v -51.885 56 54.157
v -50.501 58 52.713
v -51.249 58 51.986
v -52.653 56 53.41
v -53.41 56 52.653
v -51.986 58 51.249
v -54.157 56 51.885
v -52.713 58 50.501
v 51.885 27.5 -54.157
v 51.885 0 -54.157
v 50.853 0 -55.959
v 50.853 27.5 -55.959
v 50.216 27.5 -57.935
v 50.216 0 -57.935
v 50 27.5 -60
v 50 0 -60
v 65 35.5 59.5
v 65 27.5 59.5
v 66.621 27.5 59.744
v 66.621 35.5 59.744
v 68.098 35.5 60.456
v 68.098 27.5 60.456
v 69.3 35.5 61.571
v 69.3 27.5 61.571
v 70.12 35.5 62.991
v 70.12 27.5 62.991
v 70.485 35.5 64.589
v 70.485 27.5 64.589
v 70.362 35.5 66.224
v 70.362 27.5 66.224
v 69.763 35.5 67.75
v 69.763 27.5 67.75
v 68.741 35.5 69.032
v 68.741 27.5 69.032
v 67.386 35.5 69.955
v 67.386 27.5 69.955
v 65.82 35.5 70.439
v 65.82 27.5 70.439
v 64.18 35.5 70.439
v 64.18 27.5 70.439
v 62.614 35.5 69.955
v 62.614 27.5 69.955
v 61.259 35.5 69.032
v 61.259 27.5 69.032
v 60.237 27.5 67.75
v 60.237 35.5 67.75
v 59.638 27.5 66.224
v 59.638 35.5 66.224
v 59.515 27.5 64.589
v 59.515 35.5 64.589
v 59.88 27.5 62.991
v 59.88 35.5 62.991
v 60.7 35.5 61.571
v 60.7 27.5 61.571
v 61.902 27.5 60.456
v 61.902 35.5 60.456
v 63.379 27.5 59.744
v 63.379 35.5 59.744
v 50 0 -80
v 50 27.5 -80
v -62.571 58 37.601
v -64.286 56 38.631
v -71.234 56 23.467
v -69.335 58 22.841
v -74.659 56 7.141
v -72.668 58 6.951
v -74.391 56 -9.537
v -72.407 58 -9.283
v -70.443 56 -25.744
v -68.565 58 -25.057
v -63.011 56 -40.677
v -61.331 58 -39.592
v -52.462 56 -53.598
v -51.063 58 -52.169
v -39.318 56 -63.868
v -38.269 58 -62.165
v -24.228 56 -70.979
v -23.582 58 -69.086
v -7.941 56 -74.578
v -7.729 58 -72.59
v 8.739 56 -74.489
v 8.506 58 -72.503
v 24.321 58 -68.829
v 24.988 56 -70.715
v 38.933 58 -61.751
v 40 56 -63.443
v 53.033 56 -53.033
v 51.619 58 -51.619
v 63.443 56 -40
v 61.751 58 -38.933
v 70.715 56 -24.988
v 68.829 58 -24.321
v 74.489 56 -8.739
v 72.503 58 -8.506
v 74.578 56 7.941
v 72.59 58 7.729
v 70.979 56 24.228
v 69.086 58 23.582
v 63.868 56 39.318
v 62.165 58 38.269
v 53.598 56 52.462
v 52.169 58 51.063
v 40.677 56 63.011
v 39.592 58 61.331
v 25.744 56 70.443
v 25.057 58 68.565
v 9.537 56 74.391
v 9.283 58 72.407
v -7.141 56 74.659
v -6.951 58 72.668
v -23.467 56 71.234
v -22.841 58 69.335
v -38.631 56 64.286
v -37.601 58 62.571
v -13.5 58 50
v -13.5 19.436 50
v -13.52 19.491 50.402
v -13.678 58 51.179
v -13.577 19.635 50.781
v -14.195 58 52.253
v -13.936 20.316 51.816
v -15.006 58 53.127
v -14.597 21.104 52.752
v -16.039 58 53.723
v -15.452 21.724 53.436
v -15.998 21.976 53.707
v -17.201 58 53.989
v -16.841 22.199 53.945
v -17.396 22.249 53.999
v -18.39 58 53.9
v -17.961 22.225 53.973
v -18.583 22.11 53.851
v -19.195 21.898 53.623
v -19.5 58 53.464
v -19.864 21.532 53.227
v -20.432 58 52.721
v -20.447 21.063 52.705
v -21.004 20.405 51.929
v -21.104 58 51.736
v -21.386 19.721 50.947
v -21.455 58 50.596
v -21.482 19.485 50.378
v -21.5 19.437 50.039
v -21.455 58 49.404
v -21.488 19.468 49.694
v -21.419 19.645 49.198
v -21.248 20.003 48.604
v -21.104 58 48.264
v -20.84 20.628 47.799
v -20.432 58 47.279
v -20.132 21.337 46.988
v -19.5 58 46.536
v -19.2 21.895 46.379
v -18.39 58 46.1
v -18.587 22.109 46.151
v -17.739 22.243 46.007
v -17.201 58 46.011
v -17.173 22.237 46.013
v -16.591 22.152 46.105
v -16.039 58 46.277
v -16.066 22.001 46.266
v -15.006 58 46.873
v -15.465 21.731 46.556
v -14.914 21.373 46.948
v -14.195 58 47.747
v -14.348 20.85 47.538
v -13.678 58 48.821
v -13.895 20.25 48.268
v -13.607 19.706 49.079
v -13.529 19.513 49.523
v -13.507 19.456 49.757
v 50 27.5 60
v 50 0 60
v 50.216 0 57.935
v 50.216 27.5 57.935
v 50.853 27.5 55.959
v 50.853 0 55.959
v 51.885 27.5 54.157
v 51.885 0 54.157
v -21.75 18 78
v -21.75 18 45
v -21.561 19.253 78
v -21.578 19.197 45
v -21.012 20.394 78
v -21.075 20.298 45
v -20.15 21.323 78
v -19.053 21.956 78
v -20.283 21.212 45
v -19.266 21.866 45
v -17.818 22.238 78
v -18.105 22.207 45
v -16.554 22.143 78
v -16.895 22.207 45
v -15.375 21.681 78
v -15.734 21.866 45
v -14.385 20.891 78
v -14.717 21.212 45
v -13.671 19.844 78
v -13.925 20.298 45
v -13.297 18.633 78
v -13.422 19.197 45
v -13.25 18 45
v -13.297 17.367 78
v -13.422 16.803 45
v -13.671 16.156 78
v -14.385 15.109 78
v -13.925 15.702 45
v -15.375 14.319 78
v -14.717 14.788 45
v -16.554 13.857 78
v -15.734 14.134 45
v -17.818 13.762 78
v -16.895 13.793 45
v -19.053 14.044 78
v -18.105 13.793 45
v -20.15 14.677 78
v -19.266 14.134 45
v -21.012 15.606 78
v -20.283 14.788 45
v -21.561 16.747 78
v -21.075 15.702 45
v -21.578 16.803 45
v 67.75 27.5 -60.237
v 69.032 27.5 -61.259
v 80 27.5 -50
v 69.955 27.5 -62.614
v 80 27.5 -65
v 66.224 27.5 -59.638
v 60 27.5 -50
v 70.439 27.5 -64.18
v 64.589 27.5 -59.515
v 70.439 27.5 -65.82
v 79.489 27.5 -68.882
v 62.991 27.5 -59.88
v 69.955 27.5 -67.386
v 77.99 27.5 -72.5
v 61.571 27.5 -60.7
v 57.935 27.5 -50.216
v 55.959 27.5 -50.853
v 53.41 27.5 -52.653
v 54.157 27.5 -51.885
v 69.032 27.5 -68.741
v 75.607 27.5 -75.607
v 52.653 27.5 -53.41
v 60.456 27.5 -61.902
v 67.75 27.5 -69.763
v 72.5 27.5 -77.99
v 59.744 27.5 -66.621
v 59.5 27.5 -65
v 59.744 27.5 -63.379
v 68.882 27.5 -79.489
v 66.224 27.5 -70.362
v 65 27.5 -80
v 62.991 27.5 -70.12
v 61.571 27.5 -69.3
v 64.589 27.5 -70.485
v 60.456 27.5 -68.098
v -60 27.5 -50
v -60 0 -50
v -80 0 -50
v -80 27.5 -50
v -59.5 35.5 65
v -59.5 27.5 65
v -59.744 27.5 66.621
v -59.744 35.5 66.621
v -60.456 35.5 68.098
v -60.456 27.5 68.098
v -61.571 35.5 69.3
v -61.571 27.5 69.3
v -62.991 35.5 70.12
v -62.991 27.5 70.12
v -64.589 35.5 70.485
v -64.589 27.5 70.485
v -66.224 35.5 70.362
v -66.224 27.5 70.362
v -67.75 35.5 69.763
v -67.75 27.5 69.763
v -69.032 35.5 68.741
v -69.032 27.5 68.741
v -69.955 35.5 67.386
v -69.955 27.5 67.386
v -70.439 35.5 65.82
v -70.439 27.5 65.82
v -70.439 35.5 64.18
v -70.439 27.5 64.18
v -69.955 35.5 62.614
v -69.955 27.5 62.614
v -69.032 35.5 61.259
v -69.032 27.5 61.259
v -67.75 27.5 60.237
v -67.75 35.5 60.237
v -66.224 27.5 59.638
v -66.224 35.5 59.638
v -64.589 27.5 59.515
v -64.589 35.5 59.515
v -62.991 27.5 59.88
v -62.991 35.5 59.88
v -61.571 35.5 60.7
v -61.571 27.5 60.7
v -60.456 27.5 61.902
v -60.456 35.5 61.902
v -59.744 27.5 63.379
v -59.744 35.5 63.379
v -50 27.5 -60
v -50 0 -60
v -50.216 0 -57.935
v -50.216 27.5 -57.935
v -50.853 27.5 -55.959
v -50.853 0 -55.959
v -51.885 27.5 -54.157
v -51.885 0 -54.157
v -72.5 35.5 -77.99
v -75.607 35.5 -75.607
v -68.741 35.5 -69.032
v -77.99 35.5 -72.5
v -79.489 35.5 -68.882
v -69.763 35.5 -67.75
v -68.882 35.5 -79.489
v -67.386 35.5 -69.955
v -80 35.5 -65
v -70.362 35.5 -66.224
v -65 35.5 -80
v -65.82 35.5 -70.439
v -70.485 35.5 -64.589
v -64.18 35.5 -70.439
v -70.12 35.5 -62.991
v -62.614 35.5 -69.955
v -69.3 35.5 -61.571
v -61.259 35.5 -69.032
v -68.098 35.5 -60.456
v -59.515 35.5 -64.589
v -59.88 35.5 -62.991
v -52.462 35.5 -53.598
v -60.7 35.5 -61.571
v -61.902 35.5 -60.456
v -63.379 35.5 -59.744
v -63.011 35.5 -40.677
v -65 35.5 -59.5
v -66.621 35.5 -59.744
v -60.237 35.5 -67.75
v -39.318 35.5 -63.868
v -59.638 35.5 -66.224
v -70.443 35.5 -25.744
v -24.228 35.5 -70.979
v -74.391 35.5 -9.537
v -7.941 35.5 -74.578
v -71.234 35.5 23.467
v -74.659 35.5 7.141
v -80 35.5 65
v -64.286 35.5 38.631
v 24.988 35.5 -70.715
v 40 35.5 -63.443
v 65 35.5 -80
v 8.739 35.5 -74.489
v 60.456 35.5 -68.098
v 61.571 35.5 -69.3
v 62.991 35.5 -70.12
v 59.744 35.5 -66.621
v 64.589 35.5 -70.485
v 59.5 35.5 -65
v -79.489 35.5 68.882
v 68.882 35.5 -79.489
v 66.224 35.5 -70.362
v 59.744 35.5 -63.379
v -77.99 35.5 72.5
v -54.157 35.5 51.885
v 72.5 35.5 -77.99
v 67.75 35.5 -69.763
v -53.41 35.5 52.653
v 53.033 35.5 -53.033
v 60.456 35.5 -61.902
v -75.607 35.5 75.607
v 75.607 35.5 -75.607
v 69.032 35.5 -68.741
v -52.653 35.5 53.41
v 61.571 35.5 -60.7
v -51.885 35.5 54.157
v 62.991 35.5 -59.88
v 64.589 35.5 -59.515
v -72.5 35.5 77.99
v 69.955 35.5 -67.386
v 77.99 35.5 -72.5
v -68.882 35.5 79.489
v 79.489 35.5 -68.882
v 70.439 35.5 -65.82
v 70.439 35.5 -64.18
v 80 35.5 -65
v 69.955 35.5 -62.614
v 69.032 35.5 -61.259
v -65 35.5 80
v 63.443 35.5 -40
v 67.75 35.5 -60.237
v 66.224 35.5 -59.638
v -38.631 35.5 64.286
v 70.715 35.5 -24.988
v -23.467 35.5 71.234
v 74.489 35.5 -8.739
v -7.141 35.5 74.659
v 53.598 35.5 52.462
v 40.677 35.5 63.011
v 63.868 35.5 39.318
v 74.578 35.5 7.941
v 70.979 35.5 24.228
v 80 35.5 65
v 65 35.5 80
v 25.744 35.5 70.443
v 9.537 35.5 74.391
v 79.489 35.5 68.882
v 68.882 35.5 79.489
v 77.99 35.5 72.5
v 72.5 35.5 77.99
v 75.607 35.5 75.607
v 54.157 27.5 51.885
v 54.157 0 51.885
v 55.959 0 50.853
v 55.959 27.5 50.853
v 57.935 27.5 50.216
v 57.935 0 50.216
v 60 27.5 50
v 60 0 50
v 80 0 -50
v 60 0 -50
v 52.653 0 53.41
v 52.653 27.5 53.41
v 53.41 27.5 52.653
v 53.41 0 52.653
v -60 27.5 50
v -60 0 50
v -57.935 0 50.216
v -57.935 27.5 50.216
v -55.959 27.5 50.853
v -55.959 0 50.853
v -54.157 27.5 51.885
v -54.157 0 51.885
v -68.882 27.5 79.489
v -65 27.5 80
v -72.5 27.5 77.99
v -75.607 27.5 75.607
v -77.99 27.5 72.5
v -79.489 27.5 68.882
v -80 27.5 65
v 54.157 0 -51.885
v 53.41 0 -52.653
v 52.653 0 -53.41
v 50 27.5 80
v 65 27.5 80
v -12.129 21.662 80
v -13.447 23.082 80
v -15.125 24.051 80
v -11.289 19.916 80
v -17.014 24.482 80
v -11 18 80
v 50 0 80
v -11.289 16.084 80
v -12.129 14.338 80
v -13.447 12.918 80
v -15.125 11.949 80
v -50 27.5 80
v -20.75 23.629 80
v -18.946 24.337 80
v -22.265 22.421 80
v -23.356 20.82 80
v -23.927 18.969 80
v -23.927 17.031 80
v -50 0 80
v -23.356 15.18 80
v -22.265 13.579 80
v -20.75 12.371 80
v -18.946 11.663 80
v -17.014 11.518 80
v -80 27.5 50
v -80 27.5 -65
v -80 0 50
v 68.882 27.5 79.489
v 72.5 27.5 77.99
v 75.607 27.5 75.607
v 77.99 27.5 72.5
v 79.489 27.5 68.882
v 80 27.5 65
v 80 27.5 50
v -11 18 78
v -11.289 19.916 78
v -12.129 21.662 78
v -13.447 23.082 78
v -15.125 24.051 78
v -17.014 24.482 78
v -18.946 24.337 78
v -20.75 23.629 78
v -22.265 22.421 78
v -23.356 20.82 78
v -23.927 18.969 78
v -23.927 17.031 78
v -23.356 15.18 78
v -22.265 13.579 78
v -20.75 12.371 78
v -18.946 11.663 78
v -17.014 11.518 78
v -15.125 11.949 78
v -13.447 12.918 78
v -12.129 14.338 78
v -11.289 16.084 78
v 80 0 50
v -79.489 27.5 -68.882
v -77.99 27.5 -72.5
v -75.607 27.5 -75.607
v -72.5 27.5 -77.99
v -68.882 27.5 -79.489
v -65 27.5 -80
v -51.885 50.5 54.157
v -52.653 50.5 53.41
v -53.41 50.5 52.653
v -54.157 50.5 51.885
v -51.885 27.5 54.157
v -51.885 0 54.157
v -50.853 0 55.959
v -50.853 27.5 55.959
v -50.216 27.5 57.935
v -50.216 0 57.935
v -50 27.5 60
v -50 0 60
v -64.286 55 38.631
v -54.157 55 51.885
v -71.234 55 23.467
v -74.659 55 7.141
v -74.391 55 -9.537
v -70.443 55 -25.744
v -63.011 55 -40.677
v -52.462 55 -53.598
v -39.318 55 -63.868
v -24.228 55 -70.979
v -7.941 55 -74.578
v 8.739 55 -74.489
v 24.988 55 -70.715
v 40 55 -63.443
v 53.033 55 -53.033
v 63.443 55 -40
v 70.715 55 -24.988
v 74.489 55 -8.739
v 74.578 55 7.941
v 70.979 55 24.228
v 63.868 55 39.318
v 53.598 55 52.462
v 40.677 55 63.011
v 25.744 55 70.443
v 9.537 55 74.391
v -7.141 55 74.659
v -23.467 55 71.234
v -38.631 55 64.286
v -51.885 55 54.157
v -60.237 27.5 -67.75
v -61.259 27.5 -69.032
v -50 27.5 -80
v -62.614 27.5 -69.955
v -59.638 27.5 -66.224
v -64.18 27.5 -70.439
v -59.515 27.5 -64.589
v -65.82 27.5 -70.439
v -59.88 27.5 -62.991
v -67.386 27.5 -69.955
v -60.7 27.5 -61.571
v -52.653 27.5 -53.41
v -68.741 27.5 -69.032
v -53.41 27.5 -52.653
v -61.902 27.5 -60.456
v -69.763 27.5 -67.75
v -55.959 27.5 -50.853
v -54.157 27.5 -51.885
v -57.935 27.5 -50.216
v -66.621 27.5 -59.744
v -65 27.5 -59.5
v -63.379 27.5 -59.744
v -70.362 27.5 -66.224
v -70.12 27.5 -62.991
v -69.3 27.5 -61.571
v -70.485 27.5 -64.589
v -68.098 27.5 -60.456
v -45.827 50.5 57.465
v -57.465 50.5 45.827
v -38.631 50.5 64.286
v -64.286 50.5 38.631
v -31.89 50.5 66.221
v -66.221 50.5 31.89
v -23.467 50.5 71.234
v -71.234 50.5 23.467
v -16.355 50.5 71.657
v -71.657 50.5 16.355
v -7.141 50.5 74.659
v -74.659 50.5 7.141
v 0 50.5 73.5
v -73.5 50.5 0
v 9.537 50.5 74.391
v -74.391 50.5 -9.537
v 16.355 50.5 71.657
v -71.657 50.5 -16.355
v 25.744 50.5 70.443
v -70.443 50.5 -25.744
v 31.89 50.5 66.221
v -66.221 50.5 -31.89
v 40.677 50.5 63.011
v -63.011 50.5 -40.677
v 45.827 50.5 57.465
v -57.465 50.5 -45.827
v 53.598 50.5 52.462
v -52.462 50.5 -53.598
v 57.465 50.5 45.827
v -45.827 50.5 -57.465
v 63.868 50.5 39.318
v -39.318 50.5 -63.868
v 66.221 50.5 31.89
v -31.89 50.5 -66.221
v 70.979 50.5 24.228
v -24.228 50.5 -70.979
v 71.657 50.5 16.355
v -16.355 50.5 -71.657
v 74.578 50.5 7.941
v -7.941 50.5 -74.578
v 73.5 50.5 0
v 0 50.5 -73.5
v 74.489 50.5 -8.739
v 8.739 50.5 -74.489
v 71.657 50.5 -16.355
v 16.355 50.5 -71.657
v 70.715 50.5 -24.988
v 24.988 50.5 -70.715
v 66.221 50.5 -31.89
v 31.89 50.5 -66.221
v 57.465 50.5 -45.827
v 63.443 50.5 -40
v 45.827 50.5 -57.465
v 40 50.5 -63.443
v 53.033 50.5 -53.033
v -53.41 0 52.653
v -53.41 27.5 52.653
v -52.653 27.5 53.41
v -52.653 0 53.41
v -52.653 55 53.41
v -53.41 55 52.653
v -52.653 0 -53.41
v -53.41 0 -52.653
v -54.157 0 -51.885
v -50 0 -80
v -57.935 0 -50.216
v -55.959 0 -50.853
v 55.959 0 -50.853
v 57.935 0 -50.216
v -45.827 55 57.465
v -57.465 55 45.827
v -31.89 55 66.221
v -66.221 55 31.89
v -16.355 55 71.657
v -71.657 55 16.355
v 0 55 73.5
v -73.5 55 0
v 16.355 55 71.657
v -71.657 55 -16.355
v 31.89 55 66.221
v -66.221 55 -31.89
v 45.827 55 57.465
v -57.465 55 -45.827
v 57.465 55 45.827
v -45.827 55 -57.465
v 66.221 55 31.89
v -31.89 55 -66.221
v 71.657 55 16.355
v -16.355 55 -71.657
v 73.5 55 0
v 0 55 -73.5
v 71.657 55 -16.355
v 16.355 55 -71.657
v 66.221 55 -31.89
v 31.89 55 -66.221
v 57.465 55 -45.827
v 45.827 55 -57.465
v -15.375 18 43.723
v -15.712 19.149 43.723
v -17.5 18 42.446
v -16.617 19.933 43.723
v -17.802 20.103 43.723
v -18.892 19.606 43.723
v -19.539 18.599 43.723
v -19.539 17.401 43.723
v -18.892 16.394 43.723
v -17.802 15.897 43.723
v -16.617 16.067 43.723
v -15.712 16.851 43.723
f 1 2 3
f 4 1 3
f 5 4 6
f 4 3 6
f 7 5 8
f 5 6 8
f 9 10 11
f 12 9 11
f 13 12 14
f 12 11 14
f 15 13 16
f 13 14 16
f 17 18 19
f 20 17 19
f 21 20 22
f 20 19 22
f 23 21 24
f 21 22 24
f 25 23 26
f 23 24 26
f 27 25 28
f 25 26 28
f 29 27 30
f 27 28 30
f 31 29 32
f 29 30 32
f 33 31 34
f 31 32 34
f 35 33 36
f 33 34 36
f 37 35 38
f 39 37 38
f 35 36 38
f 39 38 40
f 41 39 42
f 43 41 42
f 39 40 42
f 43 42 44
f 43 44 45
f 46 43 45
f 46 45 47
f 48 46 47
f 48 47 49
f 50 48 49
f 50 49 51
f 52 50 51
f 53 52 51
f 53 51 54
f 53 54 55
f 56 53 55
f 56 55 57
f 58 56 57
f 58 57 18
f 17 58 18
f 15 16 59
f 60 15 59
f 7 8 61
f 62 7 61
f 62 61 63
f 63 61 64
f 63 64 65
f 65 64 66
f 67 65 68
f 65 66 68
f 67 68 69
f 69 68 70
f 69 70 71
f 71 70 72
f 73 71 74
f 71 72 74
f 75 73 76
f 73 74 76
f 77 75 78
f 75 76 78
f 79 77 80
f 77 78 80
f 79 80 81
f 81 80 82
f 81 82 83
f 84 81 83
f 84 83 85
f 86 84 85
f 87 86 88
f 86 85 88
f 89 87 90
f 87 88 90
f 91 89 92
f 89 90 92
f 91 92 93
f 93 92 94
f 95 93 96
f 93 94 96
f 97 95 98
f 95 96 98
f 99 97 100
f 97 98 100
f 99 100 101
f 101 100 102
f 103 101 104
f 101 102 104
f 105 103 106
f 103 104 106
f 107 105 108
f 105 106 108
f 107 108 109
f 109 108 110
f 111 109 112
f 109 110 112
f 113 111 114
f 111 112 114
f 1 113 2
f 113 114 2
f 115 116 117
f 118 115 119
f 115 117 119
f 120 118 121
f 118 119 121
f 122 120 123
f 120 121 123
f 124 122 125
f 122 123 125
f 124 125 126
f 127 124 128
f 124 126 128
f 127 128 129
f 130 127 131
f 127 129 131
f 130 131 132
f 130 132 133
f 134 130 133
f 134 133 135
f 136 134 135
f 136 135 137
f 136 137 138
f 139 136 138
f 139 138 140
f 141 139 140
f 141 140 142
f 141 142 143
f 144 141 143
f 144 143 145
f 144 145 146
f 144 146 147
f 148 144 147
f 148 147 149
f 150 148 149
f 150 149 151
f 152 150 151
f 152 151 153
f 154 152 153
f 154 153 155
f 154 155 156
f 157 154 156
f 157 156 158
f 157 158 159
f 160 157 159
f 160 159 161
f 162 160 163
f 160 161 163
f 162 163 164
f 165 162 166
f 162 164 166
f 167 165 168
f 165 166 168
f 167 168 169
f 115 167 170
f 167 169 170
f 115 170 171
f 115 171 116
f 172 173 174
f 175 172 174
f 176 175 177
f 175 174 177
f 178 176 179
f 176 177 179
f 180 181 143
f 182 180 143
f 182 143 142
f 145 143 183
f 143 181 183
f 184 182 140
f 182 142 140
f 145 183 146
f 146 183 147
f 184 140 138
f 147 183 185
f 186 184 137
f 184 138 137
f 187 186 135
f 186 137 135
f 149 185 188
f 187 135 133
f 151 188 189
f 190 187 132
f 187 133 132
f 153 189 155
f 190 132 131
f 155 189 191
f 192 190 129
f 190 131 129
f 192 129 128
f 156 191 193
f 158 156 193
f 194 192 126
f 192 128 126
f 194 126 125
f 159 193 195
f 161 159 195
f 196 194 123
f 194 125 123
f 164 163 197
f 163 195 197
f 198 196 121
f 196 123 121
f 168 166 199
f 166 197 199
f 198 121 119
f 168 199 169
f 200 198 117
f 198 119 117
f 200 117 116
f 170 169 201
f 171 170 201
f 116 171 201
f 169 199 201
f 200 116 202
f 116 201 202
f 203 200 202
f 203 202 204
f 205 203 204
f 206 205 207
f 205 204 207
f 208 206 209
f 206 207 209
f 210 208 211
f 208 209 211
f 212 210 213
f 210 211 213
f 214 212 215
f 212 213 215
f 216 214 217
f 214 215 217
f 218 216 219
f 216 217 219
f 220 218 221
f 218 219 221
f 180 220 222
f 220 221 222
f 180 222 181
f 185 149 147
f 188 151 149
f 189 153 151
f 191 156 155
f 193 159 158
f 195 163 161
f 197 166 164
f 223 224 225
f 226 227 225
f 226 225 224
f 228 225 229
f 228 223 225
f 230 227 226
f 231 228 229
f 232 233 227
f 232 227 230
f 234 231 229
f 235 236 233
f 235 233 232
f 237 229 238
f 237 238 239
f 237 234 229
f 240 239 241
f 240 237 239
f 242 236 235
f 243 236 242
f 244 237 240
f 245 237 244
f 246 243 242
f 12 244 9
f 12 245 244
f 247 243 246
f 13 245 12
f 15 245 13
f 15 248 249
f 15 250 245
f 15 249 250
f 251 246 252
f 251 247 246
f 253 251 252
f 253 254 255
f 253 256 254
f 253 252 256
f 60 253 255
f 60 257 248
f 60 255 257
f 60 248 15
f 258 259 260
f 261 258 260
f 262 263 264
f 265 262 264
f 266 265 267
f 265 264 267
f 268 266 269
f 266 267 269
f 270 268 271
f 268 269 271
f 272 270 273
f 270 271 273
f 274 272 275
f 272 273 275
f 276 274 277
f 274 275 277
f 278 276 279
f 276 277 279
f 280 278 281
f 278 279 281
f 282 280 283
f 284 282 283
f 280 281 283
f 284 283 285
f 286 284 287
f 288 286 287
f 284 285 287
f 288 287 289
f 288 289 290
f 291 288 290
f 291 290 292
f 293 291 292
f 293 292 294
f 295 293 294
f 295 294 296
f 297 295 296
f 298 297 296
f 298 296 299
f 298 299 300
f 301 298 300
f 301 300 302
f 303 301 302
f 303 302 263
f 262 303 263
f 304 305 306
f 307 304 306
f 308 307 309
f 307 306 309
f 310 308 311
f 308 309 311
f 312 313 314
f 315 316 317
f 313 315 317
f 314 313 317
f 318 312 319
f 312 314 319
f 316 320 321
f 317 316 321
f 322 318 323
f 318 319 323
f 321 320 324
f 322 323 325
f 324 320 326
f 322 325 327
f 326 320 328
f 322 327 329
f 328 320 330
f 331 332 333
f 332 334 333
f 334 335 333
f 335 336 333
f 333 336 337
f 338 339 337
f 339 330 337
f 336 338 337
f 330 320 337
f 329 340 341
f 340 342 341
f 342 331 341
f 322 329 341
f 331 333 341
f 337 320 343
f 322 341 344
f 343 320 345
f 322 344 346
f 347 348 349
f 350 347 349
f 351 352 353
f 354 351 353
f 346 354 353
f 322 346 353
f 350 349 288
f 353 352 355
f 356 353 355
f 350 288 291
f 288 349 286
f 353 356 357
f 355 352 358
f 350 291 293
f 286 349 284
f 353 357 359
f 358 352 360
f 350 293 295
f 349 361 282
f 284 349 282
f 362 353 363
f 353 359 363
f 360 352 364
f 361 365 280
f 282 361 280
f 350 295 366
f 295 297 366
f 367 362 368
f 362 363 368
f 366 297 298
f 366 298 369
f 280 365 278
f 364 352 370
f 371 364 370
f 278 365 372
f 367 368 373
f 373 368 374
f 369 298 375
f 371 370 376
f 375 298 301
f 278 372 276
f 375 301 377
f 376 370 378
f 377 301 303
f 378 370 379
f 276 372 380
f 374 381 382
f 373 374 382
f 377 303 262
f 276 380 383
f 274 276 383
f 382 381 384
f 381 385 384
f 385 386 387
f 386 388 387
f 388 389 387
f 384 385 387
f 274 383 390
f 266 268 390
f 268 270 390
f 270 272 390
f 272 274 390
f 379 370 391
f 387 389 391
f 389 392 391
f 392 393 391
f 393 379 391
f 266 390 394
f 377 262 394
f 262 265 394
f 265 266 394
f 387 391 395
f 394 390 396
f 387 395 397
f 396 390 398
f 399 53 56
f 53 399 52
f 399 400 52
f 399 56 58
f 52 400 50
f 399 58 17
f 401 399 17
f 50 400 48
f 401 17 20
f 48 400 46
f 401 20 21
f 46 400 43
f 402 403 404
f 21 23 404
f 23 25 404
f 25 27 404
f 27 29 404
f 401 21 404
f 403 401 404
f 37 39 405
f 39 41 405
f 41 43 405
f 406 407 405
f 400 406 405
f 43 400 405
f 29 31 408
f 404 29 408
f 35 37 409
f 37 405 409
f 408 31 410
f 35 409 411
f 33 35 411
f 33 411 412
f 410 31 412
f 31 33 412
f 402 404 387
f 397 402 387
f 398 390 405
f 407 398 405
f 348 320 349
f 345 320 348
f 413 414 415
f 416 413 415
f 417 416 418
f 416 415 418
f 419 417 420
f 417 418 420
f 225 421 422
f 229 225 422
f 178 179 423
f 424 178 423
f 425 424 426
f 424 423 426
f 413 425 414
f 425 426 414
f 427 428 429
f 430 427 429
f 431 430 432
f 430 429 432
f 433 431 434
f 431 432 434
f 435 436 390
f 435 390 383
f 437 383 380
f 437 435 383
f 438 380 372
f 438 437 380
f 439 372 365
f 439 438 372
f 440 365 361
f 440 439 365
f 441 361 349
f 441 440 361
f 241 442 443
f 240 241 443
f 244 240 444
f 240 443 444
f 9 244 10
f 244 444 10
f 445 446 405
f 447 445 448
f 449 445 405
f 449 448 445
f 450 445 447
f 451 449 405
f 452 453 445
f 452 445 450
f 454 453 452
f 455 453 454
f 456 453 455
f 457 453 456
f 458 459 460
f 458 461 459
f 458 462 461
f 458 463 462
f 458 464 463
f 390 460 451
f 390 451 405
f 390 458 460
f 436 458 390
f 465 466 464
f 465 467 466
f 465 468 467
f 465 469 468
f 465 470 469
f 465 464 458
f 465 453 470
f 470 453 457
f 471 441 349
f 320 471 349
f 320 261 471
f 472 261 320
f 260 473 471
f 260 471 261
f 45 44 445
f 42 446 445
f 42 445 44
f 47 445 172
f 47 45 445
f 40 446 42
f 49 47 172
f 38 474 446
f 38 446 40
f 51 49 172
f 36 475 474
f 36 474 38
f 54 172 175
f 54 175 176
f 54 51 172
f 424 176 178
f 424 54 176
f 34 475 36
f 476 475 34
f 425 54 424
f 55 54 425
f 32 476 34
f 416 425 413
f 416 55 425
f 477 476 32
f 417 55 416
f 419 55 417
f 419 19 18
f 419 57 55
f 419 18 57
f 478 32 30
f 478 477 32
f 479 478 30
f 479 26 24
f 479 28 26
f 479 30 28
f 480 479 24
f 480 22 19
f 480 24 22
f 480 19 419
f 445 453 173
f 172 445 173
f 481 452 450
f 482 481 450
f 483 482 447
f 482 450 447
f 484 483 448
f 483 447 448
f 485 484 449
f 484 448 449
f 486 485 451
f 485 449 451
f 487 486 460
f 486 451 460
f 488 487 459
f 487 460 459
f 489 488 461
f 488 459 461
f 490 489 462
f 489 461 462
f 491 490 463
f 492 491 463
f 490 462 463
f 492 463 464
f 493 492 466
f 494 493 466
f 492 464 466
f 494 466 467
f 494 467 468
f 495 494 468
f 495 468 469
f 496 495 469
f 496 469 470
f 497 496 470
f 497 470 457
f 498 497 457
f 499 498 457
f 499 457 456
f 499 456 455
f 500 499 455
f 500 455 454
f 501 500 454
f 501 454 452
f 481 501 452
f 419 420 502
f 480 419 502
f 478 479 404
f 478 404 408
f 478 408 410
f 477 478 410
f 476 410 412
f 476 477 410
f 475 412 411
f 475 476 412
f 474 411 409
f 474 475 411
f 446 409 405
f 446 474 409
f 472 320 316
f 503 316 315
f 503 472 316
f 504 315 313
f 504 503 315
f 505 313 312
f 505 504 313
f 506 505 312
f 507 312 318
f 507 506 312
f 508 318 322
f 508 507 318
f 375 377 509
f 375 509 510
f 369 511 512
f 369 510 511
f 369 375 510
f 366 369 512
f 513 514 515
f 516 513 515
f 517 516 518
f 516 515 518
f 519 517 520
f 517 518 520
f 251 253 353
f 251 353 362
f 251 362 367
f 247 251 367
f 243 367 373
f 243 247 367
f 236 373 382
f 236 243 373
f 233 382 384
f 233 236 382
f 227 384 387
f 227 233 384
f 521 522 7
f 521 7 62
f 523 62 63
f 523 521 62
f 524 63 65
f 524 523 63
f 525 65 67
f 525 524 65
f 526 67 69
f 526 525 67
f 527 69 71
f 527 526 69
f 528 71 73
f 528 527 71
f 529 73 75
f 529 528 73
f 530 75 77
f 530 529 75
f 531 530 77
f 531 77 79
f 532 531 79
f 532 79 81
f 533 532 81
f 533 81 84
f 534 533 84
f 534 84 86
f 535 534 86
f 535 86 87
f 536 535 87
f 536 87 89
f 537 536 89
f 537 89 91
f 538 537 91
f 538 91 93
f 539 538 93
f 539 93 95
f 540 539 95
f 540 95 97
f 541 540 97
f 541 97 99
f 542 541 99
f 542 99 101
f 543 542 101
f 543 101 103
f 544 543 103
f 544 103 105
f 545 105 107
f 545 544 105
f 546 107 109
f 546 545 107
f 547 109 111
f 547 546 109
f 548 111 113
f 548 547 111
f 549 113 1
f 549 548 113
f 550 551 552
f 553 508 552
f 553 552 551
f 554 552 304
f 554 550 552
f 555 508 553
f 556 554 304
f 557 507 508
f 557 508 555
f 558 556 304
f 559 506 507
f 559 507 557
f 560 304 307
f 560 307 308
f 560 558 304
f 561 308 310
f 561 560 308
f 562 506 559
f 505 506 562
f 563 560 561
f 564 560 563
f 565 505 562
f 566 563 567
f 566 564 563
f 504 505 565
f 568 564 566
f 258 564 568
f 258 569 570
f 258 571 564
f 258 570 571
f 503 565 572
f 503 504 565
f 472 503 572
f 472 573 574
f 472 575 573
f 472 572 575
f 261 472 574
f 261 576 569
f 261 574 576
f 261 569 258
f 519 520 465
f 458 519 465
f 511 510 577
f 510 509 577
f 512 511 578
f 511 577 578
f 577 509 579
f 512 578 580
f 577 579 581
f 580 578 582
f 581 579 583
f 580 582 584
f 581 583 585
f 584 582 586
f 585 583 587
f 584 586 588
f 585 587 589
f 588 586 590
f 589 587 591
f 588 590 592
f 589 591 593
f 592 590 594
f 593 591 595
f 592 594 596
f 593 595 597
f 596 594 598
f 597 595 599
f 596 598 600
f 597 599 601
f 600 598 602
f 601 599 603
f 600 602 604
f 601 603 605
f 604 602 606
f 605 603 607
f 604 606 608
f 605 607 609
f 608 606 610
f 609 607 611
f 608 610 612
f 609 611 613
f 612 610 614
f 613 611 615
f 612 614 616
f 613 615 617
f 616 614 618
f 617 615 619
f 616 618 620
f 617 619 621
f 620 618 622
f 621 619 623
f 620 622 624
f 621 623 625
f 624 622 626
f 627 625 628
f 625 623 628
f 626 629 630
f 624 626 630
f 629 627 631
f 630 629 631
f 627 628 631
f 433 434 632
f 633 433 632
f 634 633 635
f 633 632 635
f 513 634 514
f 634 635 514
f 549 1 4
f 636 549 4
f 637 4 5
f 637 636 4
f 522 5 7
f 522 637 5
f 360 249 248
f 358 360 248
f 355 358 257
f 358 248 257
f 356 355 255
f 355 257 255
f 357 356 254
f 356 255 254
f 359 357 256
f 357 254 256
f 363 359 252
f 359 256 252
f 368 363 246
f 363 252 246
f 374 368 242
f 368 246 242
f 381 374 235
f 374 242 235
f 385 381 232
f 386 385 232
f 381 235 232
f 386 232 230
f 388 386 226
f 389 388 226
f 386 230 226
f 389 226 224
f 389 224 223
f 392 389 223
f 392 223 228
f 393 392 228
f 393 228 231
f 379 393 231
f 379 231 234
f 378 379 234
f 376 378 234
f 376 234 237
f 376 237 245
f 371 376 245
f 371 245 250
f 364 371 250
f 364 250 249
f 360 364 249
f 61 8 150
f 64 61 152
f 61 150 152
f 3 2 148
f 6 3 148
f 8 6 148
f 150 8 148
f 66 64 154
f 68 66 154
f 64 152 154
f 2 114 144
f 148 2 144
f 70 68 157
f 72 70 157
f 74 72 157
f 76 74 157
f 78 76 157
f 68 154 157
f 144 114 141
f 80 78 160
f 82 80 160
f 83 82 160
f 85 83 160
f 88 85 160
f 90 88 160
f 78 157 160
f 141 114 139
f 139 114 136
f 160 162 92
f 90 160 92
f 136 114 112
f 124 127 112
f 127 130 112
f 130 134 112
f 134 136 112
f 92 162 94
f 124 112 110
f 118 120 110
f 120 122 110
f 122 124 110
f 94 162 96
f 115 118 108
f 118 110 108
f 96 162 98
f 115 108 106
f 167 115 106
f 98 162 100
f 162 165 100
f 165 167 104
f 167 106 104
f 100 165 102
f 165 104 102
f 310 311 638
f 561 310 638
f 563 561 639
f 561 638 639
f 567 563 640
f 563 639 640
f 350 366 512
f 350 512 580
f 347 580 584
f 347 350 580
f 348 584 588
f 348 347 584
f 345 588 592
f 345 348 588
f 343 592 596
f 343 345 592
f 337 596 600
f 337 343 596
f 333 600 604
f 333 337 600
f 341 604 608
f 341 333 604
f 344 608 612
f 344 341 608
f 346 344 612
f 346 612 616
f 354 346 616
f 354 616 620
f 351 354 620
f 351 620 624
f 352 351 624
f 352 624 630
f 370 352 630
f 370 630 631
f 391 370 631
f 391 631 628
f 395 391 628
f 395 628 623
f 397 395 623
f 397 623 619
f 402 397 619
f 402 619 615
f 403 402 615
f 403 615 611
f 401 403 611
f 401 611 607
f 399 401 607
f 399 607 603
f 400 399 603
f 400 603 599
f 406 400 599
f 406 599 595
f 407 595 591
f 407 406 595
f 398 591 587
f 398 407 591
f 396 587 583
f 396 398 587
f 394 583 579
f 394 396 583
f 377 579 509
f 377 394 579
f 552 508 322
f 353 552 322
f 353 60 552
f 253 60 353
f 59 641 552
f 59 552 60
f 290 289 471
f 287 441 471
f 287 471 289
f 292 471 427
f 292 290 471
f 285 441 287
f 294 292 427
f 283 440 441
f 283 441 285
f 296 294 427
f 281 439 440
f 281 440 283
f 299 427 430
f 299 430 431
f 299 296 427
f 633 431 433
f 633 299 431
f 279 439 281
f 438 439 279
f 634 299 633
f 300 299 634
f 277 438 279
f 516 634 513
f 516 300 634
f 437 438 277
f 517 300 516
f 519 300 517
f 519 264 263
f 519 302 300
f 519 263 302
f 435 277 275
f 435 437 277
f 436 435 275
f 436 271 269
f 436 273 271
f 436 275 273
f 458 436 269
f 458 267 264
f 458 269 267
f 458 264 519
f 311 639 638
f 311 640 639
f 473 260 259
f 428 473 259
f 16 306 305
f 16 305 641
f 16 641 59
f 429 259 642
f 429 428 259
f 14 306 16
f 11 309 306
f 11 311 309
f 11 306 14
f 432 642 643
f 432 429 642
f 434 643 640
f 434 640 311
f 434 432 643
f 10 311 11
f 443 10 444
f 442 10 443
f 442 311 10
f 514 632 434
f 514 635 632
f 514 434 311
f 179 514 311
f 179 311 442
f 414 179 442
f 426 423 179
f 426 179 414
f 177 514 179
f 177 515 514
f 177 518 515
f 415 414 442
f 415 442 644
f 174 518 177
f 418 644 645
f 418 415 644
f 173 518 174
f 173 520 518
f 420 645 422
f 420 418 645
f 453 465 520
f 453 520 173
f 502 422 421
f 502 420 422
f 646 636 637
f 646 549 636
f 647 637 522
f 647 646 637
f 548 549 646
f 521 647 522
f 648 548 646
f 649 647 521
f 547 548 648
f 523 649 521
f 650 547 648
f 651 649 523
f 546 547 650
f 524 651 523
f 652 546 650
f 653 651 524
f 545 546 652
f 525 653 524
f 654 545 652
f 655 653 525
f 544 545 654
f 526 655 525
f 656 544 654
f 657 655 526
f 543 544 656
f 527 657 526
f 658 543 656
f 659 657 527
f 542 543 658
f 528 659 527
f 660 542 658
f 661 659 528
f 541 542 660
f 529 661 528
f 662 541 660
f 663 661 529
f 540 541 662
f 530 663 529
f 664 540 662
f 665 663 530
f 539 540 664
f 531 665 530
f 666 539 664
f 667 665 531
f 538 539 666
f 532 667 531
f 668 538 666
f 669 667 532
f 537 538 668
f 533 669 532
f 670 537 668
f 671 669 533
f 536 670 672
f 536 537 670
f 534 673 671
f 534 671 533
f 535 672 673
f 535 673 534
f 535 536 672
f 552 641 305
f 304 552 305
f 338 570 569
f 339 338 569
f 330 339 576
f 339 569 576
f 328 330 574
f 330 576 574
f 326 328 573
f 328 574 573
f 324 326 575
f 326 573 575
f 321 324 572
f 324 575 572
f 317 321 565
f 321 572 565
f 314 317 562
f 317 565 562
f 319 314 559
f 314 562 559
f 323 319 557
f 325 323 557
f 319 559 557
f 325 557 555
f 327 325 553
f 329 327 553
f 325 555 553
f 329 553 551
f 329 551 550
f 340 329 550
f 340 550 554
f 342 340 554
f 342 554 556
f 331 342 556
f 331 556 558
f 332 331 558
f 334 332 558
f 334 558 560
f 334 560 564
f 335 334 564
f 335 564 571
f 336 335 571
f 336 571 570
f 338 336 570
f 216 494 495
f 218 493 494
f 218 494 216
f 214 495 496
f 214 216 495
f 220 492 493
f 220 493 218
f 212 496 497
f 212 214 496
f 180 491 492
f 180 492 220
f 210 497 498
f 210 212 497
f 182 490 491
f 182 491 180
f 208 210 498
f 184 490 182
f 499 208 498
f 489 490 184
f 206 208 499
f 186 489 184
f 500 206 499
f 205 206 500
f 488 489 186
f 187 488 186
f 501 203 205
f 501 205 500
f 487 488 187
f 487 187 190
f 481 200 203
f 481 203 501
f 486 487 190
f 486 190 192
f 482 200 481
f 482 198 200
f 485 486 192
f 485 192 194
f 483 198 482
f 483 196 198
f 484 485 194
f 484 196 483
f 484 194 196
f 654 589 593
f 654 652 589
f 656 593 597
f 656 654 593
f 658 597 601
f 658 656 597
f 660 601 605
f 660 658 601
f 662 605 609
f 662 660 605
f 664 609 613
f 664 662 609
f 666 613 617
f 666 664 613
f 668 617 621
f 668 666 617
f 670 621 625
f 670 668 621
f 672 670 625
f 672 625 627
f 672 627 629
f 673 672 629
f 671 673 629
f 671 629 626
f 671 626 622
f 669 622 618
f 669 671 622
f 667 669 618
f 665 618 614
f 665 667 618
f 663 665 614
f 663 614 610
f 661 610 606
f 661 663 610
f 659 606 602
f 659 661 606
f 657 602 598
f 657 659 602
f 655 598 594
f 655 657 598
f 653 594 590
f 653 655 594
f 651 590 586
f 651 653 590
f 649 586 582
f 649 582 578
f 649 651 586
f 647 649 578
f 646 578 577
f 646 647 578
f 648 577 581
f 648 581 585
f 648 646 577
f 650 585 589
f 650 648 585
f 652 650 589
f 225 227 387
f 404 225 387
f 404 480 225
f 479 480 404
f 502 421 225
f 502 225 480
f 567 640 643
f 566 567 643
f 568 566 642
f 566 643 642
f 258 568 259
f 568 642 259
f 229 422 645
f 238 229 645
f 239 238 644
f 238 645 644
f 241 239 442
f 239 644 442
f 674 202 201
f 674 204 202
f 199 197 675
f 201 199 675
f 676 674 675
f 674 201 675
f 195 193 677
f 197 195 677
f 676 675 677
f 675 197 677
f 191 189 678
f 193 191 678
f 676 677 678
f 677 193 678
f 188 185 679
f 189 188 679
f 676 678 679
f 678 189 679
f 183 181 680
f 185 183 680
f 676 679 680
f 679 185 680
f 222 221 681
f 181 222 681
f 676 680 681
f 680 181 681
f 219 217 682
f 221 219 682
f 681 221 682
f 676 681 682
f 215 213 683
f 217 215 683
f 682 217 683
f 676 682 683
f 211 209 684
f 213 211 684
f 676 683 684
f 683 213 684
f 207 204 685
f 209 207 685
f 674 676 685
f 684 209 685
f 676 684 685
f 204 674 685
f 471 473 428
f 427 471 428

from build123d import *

# Parameters (mm, degrees)
F1_DEPTH        = 58
F0_R            = 5.5
F2_DEPTH        = 35.5
F3_DEPTH        = 35.5
F3_COPIES_COUNT = 4
F4_DEPTH        = 27.5
F4_COPIES_COUNT = 4
F5_SIZE         = 2
F7_D            = 8.5
F7_DEPTH        = 35
F7_CBORE_D      = 13
F7_CBORE_DEPTH  = 2
F7_TIP          = 2.5536576309
F9_D            = 8
F9_DEPTH        = 40
F9_TIP          = 2.4034424761
F10_W           = 4.5
F10_H           = 1.5


# Not quite as in the source:
# - a pattern or mirror of a feature is missing from the dataset's text; its kind, count and spacing are read off the source's solid


with BuildPart() as f1:
    # F0 (on Front) → F1 (new body)
    with BuildSketch(Plane.XZ):
        with BuildLine():
            ThreePointArc((-51.8845091547, 54.1571575119), (-52.9289321881, 52.9289321881), (-54.1571575119, 51.8845091547))
            ThreePointArc((-54.1571575119, 51.8845091547), (-27.9572279259, -69.5944926463), (75, 0))
            ThreePointArc((75, 0), (29.4419922338, 68.979483133), (-51.8845091547, 54.1571575119))
        make_face()
        with BuildLine():
            ThreePointArc((-51.8845091547, 54.1571575119), (-53.033008589, 53.033008589), (-54.1571575119, 51.8845091547))
            ThreePointArc((-54.1571575119, 51.8845091547), (-52.9289321881, 52.9289321881), (-51.8845091547, 54.1571575119))
        make_face()
    extrude(amount=-F1_DEPTH)

    # F0 (on Front) → F2 (join)
    with BuildSketch(Plane.XZ):
        with BuildLine():
            Line((-65, -80), (65, -80))
            ThreePointArc((65, -80), (75.6066017178, -75.6066017178), (80, -65))
            Line((80, -65), (80, 65))
            ThreePointArc((80, 65), (75.6066017178, 75.6066017178), (65, 80))
            Line((65, 80), (-50, 80))
            Line((-50, 80), (-50, 60))
            ThreePointArc((-50, 60), (-50.4827811717, 56.9303834484), (-51.8845091547, 54.1571575119))
            ThreePointArc((-51.8845091547, 54.1571575119), (29.4419922338, 68.979483133), (75, 0))
            ThreePointArc((75, 0), (-27.9572279259, -69.5944926463), (-54.1571575119, 51.8845091547))
            ThreePointArc((-54.1571575119, 51.8845091547), (-56.9303834484, 50.4827811717), (-60, 50))
            Line((-60, 50), (-80, 50))
            Line((-80, 50), (-80, -65))
            ThreePointArc((-80, -65), (-75.6066017178, -75.6066017178), (-65, -80))
        make_face()
        with BuildLine():
            Line((-80, 65), (-80, 50))
            Line((-80, 50), (-60, 50))
            ThreePointArc((-60, 50), (-56.9303834484, 50.4827811717), (-54.1571575119, 51.8845091547))
            ThreePointArc((-54.1571575119, 51.8845091547), (-53.033008589, 53.033008589), (-51.8845091547, 54.1571575119))
            ThreePointArc((-51.8845091547, 54.1571575119), (-50.4827811717, 56.9303834484), (-50, 60))
            Line((-50, 60), (-50, 80))
            Line((-50, 80), (-65, 80))
            ThreePointArc((-65, 80), (-75.6066017178, 75.6066017178), (-80, 65))
        make_face()
        with Locations((-65, 65)):
            Circle(F0_R, mode=Mode.SUBTRACT)
        with Locations((-65, 65)):
            Circle(F0_R)
    extrude(amount=-F2_DEPTH)

    # F0 (on Front) → F3 (cut, through all)
    with BuildSketch(Plane.XZ):
        with Locations((-65, 65)):
            Circle(F0_R)
    f3 = extrude(amount=-F3_DEPTH, mode=Mode.SUBTRACT)

    # F3_copies: F3 ×4 about axis
    f3_copies_axis = Axis((0, 0, 0), (0, 1, 0))
    for i in range(1, F3_COPIES_COUNT):
        add(f3.rotate(f3_copies_axis, i * 360 / F3_COPIES_COUNT), mode=Mode.SUBTRACT)

    # F0 (on Front) → F4 (cut)
    with BuildSketch(Plane.XZ):
        with BuildLine():
            Line((-80, 65), (-80, 50))
            Line((-80, 50), (-60, 50))
            ThreePointArc((-60, 50), (-56.9303834484, 50.4827811717), (-54.1571575119, 51.8845091547))
            ThreePointArc((-54.1571575119, 51.8845091547), (-53.033008589, 53.033008589), (-51.8845091547, 54.1571575119))
            ThreePointArc((-51.8845091547, 54.1571575119), (-50.4827811717, 56.9303834484), (-50, 60))
            Line((-50, 60), (-50, 80))
            Line((-50, 80), (-65, 80))
            ThreePointArc((-65, 80), (-75.6066017178, 75.6066017178), (-80, 65))
        make_face()
        with Locations((-65, 65)):
            Circle(F0_R, mode=Mode.SUBTRACT)
    f4 = extrude(amount=-F4_DEPTH, mode=Mode.SUBTRACT)

    # F4_copies: F4 ×4 about axis
    f4_copies_axis = Axis((0, 0, 0), (0, 1, 0))
    for i in range(1, F4_COPIES_COUNT):
        add(f4.rotate(f4_copies_axis, i * 360 / F4_COPIES_COUNT), mode=Mode.SUBTRACT)

    # F5
    f5_edges = [f1.edges().sort_by_distance(p)[0] for p in [
        (-75, 58, 0),
    ]]
    chamfer(f5_edges, length=F5_SIZE)

    # F7
    with Locations(Plane.XY.offset(80)):
        with Locations((-17.5, 18)):
            CounterBoreHole(F7_D / 2, F7_CBORE_D / 2, F7_CBORE_DEPTH, depth=F7_DEPTH)
            with Locations((0, 0, -(F7_DEPTH + F7_TIP / 2))):  # 118° drill point
                Cone(0, F7_D / 2, F7_TIP, mode=Mode.SUBTRACT)

    # F9
    with Locations(Plane(origin=(0, 58, 0), x_dir=(-1, 0, 0), z_dir=(0, 1, 0))):
        with Locations((17.5, 50)):
            Hole(F9_D / 2, depth=F9_DEPTH)
            with Locations((0, 0, -(F9_DEPTH + F9_TIP / 2))):  # 118° drill point
                Cone(0, F9_D / 2, F9_TIP, mode=Mode.SUBTRACT)

    # F10 (on Right) → F11 (revolve, cut)
    with BuildSketch(Plane.YZ):
        with Locations((52.75, 74.25)):
            Rectangle(F10_W, F10_H)
    revolve(axis=Axis((0, 29, 0), (0, 1, 0)), mode=Mode.SUBTRACT)


solid = f1.part
